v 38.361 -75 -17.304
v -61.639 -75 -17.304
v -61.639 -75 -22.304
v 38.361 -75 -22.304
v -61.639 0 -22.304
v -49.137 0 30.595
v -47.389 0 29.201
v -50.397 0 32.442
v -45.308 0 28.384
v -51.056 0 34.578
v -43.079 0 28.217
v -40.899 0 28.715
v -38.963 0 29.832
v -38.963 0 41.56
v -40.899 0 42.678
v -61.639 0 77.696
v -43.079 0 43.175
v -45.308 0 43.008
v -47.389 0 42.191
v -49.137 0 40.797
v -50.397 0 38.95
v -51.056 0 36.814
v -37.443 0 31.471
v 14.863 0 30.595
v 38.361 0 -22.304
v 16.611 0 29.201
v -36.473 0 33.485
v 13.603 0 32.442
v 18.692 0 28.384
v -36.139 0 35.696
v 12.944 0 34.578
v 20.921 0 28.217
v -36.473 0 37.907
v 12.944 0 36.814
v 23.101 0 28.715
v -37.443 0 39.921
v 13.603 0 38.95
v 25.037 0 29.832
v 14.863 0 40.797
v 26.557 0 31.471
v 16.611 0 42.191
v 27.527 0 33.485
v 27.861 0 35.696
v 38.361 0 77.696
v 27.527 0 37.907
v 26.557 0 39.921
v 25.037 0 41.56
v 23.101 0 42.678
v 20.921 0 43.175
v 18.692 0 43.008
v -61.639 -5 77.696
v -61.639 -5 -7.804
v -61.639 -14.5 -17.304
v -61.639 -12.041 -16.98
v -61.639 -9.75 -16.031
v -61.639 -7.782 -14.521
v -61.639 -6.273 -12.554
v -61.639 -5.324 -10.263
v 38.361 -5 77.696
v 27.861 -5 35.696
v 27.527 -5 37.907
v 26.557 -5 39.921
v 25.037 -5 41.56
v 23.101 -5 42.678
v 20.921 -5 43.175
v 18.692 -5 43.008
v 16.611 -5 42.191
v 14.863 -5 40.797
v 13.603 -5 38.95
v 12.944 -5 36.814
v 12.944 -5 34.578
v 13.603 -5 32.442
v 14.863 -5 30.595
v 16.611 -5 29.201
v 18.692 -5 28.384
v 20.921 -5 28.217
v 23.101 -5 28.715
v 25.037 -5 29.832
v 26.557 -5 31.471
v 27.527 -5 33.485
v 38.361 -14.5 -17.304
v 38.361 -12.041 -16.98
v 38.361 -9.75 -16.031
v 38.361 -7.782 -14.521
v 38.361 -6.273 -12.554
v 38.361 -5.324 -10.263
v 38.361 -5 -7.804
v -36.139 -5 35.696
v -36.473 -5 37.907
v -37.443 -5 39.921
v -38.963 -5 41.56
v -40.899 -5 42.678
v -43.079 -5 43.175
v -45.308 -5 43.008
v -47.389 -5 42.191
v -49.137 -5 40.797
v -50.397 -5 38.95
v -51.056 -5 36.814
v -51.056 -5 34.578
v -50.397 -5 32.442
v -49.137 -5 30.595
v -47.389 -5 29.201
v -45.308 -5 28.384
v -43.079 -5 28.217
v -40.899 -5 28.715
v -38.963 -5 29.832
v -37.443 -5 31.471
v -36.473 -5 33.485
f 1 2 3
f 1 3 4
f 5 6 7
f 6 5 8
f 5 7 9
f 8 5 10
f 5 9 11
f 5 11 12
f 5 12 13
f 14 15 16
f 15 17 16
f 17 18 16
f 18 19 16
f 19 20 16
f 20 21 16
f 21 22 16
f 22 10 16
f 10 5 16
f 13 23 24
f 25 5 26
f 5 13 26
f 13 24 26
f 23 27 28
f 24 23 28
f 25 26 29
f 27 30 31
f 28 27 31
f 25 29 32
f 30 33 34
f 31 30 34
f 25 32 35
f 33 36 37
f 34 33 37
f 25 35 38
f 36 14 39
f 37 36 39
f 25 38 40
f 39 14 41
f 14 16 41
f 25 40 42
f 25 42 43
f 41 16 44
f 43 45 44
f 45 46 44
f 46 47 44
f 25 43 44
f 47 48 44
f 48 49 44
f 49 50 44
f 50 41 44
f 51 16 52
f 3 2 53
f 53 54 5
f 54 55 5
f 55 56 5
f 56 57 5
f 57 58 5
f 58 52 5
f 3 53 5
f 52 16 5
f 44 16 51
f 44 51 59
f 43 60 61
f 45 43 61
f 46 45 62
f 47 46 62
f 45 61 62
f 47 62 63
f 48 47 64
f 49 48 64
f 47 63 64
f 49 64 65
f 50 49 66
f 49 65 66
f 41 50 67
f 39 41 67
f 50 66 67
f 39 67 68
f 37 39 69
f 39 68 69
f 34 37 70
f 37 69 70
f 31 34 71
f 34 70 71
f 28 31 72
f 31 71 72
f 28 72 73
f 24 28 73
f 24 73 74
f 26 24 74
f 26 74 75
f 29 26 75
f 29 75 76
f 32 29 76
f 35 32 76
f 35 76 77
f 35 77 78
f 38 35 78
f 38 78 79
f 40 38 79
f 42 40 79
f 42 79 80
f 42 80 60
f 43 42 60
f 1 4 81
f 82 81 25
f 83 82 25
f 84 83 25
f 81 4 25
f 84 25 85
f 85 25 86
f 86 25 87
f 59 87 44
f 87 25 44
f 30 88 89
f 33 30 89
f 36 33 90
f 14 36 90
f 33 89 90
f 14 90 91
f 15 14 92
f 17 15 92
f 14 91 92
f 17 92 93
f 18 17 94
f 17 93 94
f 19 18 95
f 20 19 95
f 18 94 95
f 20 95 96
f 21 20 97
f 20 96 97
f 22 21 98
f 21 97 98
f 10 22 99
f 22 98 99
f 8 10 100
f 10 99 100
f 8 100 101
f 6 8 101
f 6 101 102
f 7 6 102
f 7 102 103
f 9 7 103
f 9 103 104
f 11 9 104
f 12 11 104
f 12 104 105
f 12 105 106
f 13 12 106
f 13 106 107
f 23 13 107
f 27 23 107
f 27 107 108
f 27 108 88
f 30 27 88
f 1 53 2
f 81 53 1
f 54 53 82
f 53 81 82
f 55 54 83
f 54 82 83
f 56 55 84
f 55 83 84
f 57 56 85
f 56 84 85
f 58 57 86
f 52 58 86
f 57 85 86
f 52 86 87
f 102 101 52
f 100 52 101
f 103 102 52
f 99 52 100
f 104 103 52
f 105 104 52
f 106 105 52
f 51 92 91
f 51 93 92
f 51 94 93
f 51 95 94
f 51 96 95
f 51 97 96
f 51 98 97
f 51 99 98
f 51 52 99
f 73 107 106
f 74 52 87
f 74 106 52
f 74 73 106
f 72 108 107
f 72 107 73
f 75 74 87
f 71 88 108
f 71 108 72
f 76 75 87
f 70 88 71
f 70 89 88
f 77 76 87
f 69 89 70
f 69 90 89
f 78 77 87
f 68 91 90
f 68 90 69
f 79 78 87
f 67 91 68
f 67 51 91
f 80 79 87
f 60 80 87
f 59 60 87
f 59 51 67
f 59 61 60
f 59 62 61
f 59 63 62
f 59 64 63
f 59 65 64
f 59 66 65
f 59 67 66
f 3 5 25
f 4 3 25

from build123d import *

# Parameters (mm, degrees)
F0_W     = 100
F0_H     = 5
F1_DEPTH = 75
F0_H_2   = 95
F2_DEPTH = 5
F3_R     = 9.5
F4_R     = 7.5
F5_DEPTH = 5.001


with BuildPart() as f1:
    # F0 (on Front) → F1 (new body)
    with BuildSketch(Plane.XZ):
        with Locations((-11.639485, -19.803855)):
            Rectangle(F0_W, F0_H)
    extrude(amount=F1_DEPTH)

    # F0 (on Front) → F2 (join)
    with BuildSketch(Plane.XZ):
        with Locations((-11.639485, 30.196145)):
            Rectangle(F0_W, F0_H_2)
        with Locations((-11.639485, -19.803855)):
            Rectangle(F0_W, F0_H)
    extrude(amount=F2_DEPTH)

    # F3
    f3_edges = [f1.edges().sort_by_distance(p)[0] for p in [
        (-11.639485, -5, -17.303855),
    ]]
    fillet(f3_edges, radius=F3_R)

    # F4 (on face) → F5 (cut, through all)
    with BuildSketch(Plane.XZ.offset(5)):
        with Locations((20.360515, 35.696145)):
            Circle(F4_R)
        with Locations((-43.639485, 35.696145)):
            Circle(F4_R)
    extrude(amount=-F5_DEPTH, mode=Mode.SUBTRACT)


solid = f1.part
